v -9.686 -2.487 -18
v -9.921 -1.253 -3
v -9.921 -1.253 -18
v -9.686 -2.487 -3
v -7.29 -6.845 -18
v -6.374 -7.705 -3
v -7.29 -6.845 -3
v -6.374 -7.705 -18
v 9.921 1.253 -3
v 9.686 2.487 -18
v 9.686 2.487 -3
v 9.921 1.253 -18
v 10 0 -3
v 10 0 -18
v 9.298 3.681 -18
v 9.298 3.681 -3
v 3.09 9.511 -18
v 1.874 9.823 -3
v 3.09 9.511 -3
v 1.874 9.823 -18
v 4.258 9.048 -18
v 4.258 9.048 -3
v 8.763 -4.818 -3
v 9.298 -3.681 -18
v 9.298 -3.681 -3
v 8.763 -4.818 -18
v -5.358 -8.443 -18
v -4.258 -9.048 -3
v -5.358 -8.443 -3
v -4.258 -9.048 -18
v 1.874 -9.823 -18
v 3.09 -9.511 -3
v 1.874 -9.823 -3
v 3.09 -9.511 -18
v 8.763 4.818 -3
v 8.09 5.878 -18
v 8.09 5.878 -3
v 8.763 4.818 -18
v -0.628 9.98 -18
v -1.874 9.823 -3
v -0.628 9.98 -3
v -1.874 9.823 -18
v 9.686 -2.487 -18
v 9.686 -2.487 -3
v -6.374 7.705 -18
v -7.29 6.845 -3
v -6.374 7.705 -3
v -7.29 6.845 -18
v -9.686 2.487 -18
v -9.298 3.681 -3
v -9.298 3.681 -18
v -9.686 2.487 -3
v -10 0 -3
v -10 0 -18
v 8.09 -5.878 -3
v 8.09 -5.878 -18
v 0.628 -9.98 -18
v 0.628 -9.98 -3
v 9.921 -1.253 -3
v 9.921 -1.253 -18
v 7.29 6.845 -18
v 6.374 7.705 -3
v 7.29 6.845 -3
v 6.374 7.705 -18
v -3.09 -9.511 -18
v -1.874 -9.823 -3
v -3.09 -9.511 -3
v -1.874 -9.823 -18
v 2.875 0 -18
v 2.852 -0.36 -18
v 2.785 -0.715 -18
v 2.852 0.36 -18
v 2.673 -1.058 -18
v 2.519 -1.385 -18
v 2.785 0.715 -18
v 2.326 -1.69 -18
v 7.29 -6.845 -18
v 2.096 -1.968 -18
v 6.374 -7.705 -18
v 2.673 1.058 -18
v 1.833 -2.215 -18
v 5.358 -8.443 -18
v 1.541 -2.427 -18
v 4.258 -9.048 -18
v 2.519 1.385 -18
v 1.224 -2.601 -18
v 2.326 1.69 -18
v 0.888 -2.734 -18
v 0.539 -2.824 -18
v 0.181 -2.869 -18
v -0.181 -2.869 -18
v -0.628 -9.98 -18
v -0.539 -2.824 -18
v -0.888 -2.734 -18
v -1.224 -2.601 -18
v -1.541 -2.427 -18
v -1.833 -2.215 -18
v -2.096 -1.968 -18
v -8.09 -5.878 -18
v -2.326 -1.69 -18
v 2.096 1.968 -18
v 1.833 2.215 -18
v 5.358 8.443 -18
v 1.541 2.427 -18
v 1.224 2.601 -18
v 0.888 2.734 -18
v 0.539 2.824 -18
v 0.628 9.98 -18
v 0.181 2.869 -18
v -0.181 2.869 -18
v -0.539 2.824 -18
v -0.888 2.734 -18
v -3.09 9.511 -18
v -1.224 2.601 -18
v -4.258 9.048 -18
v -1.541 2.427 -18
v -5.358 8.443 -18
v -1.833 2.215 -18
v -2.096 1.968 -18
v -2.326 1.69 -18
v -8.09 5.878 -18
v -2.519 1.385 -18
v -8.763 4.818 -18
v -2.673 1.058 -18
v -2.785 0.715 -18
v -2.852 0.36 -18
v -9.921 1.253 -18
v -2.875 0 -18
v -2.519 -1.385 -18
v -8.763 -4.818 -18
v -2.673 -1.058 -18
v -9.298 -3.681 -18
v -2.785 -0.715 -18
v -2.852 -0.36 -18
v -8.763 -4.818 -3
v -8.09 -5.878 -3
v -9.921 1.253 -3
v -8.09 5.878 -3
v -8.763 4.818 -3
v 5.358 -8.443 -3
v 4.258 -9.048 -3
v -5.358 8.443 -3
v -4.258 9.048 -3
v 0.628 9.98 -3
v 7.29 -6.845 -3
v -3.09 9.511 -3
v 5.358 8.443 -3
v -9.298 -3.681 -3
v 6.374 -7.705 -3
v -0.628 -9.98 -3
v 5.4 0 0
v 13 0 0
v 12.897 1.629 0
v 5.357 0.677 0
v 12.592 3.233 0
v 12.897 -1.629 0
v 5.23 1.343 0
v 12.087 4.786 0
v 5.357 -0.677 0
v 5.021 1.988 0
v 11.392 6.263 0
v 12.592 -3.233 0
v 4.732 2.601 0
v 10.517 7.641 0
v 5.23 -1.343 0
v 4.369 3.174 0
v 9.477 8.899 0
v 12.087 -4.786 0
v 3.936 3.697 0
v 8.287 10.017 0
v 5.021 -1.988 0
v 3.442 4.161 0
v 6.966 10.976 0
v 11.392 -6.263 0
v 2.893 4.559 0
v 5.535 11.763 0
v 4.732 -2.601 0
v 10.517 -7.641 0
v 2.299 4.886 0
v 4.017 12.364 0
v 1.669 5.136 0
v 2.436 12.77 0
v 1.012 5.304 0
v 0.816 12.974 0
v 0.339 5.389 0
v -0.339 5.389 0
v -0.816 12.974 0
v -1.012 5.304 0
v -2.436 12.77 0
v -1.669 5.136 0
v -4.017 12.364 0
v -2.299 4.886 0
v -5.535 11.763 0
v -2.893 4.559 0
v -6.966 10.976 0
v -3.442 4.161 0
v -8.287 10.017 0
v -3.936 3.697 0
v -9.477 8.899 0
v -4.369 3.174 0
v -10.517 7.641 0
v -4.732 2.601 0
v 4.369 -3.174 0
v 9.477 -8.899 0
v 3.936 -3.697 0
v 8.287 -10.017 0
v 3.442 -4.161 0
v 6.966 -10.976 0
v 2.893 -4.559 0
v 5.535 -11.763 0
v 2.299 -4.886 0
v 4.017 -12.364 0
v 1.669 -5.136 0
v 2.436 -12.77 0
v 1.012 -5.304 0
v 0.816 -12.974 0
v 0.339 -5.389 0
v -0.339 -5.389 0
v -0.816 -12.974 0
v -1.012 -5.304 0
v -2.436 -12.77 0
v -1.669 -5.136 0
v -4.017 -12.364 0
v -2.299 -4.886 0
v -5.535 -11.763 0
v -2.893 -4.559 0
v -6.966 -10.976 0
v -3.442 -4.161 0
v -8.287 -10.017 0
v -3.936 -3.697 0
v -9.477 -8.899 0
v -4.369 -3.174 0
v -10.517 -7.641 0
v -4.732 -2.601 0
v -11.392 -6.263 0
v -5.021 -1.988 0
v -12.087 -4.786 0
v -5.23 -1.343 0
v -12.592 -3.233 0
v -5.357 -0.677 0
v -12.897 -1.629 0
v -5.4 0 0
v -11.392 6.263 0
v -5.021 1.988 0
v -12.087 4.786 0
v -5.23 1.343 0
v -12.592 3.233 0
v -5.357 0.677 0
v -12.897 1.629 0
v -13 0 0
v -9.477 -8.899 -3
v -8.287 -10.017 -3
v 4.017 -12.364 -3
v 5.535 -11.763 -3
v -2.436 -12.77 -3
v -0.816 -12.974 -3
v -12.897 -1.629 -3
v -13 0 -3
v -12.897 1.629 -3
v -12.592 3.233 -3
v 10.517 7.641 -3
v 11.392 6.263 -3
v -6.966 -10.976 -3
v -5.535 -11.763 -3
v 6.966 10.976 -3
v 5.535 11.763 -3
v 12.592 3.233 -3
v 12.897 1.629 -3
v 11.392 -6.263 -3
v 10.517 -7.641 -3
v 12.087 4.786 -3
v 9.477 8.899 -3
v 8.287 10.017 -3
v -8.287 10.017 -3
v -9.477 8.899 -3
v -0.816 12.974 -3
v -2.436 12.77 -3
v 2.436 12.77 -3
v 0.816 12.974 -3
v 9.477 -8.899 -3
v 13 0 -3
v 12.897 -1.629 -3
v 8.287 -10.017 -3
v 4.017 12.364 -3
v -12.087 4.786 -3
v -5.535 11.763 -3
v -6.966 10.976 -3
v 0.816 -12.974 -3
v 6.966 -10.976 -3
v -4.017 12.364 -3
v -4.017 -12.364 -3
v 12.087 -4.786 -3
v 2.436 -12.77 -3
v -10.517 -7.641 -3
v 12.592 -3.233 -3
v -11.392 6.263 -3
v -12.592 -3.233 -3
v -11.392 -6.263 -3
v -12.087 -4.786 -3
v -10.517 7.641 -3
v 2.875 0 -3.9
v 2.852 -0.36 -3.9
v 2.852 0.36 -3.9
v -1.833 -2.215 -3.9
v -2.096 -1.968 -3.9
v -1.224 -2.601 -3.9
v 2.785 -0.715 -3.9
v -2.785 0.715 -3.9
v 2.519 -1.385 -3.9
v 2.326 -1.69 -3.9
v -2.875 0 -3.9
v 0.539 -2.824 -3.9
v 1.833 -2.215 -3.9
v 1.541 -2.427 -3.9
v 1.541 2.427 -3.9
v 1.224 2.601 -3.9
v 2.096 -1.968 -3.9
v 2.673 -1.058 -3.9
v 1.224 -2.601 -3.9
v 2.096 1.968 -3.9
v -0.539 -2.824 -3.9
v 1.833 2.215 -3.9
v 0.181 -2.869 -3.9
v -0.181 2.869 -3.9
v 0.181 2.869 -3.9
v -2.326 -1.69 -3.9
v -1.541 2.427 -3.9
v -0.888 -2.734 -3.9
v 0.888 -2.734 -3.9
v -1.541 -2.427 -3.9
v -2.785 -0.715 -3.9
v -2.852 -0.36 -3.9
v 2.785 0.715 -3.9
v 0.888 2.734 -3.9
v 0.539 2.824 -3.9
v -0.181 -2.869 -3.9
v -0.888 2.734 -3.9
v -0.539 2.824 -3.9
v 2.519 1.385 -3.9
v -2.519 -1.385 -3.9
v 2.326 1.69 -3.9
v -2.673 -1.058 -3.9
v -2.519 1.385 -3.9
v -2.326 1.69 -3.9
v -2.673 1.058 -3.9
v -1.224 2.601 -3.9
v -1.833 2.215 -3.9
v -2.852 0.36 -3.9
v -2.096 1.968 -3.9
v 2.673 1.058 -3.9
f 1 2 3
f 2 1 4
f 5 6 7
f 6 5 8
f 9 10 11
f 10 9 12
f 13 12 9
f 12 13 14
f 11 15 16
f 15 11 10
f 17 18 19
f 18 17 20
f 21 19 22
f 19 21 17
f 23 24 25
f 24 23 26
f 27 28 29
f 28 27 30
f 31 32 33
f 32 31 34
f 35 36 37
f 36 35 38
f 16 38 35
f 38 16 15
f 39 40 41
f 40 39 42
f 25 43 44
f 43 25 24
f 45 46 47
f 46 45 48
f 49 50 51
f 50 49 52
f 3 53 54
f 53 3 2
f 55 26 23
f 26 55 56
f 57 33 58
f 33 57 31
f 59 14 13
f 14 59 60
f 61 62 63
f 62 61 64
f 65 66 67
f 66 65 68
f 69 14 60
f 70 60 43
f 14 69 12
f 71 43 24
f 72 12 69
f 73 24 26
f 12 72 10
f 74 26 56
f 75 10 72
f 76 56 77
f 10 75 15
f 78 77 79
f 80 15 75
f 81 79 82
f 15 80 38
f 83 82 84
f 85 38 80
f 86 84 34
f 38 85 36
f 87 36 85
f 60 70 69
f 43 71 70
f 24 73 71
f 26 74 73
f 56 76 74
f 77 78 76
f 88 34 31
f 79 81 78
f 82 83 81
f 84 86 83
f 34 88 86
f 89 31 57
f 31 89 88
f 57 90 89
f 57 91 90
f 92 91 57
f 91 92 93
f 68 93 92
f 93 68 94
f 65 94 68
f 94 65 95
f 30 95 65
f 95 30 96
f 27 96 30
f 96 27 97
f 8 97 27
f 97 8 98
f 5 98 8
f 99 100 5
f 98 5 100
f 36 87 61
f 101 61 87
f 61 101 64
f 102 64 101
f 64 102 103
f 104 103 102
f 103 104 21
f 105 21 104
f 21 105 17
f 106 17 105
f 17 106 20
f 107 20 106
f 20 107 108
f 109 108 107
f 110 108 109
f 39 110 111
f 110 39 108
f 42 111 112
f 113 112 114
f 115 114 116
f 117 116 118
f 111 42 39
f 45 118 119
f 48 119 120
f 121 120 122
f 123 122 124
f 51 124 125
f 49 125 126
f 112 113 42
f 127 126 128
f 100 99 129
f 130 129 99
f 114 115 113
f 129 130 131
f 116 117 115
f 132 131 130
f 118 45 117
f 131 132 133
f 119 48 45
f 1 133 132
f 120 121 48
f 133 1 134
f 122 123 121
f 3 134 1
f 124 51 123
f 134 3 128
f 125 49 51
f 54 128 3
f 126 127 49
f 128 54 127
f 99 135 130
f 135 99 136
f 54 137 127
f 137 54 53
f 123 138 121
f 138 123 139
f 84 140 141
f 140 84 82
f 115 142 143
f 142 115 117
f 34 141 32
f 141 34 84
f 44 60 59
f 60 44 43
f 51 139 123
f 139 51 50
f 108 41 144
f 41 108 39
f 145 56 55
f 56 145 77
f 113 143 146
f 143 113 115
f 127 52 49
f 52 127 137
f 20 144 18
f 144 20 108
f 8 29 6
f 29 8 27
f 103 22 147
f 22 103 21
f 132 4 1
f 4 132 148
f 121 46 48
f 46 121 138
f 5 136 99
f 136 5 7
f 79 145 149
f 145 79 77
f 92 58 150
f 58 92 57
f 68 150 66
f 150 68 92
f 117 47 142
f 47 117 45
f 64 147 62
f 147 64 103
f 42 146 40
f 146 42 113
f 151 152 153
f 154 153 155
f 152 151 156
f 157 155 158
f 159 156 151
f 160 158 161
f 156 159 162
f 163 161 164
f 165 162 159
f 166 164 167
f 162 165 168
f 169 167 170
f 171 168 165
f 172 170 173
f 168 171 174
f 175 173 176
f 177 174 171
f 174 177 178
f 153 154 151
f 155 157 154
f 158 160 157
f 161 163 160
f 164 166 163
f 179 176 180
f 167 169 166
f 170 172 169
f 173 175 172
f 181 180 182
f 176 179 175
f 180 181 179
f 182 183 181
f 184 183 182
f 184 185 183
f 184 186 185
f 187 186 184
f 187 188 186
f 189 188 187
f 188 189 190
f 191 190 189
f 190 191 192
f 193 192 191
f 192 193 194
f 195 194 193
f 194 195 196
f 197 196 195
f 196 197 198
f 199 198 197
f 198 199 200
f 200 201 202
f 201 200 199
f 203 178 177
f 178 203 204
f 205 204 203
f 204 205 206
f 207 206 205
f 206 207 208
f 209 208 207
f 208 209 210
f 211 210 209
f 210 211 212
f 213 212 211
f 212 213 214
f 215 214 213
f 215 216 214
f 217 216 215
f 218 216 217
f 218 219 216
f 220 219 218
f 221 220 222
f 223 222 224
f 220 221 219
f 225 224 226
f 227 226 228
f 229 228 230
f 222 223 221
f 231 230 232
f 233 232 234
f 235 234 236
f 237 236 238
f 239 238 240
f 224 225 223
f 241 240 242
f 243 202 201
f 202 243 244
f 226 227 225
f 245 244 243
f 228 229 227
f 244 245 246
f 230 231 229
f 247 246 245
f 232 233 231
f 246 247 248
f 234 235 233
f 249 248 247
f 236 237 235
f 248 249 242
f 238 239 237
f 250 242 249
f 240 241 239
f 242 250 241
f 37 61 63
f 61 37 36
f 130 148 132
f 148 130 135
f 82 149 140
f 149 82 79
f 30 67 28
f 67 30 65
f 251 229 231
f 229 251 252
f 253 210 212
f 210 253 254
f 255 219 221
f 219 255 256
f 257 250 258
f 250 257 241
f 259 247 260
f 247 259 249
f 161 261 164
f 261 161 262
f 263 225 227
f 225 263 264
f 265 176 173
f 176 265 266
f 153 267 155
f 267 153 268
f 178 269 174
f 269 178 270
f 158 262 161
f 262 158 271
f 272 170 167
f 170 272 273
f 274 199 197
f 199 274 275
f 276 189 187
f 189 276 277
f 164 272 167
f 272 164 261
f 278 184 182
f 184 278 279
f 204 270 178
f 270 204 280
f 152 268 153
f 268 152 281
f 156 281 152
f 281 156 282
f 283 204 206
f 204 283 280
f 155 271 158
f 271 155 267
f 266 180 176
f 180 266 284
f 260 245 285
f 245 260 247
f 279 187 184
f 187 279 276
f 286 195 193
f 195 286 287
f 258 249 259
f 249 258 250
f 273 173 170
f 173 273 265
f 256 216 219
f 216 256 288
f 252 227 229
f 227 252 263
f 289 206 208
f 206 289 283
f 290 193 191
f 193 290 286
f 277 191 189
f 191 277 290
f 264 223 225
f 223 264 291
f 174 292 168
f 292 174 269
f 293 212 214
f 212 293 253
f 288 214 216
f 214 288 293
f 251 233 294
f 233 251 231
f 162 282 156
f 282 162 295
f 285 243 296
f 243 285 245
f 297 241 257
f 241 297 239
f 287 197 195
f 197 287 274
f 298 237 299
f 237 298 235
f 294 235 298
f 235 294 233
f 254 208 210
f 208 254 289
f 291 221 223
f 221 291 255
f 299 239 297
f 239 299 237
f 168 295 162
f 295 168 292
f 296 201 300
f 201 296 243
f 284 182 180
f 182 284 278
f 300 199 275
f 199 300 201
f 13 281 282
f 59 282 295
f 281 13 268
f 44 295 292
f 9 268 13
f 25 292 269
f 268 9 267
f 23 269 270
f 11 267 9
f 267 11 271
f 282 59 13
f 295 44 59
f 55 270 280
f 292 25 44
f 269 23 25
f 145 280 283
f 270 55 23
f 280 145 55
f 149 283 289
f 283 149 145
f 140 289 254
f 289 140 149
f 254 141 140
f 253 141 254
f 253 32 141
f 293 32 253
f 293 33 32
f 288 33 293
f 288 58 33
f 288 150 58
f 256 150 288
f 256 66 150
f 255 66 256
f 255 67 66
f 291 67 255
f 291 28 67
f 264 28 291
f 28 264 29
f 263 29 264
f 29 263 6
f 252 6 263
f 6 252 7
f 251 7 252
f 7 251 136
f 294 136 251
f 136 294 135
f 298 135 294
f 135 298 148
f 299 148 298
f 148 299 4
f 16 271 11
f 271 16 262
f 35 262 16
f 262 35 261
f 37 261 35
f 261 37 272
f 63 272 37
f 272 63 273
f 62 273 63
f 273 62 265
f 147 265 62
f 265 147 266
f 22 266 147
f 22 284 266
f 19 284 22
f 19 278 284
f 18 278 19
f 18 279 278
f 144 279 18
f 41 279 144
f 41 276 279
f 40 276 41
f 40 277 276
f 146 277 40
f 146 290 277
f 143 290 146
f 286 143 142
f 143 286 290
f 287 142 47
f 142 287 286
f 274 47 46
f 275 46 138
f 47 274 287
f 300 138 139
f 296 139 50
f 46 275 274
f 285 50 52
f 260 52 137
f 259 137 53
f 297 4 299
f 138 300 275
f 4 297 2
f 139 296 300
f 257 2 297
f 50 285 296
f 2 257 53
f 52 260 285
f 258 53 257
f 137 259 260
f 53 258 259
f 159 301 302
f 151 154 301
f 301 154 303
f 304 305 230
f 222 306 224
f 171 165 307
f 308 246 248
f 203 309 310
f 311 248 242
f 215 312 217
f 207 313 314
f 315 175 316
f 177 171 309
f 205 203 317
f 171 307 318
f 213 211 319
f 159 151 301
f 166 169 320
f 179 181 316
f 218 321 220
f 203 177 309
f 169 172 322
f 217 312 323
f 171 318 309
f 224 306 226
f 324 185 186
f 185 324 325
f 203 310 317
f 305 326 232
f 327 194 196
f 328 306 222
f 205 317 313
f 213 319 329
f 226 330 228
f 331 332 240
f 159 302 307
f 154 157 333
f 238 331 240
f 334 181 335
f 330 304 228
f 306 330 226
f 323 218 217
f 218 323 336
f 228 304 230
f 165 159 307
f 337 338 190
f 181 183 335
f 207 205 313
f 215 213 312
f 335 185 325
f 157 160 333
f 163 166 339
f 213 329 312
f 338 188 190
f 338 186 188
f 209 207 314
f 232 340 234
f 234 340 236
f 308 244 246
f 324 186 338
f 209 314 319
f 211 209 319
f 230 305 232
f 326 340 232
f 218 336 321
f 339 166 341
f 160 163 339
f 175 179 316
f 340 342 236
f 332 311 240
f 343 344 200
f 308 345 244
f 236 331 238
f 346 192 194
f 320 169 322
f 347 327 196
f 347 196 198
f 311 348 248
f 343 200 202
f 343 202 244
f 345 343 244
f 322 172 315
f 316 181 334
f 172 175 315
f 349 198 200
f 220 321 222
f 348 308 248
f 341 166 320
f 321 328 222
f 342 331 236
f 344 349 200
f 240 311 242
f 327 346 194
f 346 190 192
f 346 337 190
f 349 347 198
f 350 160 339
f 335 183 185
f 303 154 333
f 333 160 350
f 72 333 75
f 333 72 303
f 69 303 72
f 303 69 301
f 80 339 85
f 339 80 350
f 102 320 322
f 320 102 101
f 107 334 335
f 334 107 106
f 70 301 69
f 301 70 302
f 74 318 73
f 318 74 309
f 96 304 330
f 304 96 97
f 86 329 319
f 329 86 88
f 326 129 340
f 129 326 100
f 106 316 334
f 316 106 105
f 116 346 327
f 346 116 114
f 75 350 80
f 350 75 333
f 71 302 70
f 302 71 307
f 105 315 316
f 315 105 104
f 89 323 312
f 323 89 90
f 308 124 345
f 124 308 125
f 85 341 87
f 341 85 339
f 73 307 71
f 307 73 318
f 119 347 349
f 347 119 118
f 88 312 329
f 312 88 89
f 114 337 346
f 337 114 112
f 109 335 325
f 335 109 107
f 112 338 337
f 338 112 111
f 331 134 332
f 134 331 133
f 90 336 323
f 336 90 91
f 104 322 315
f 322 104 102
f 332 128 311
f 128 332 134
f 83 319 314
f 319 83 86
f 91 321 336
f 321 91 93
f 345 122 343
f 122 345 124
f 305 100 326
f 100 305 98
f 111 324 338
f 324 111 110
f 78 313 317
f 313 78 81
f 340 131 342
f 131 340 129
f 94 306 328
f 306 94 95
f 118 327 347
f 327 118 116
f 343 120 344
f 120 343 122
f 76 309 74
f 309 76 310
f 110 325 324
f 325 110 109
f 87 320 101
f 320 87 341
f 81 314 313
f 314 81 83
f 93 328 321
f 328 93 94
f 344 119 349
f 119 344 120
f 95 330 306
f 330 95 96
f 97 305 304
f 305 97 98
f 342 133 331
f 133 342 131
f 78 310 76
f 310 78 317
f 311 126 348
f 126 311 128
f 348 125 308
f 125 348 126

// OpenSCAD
$fn = 50;


difference() {
	union() {
		translate(v = [0, 0, -18.0000000000]) {
			cylinder(h = 18, r = 10.0000000000);
		}
		translate(v = [0, 0, -3.0000000000]) {
			cylinder(h = 3, r = 13.0000000000);
		}
	}
	union() {
		translate(v = [0, 0, 0]) {
			rotate(a = [0, 0, 0]) {
				difference() {
					union() {
						#translate(v = [0, 0, -18.0000000000]) {
							cylinder(h = 18, r = 2.6000000000);
						}
						#translate(v = [0, 0, -3.9000000000]) {
							cylinder(h = 3.9000000000, r1 = 2.8750000000, r2 = 5.4000000000);
						}
						#translate(v = [0, 0, -18.0000000000]) {
							cylinder(h = 18, r = 2.8750000000);
						}
						#translate(v = [0, 0, -18.0000000000]) {
							cylinder(h = 18, r = 2.6000000000);
						}
					}
					union();
				}
			}
		}
	}
}
